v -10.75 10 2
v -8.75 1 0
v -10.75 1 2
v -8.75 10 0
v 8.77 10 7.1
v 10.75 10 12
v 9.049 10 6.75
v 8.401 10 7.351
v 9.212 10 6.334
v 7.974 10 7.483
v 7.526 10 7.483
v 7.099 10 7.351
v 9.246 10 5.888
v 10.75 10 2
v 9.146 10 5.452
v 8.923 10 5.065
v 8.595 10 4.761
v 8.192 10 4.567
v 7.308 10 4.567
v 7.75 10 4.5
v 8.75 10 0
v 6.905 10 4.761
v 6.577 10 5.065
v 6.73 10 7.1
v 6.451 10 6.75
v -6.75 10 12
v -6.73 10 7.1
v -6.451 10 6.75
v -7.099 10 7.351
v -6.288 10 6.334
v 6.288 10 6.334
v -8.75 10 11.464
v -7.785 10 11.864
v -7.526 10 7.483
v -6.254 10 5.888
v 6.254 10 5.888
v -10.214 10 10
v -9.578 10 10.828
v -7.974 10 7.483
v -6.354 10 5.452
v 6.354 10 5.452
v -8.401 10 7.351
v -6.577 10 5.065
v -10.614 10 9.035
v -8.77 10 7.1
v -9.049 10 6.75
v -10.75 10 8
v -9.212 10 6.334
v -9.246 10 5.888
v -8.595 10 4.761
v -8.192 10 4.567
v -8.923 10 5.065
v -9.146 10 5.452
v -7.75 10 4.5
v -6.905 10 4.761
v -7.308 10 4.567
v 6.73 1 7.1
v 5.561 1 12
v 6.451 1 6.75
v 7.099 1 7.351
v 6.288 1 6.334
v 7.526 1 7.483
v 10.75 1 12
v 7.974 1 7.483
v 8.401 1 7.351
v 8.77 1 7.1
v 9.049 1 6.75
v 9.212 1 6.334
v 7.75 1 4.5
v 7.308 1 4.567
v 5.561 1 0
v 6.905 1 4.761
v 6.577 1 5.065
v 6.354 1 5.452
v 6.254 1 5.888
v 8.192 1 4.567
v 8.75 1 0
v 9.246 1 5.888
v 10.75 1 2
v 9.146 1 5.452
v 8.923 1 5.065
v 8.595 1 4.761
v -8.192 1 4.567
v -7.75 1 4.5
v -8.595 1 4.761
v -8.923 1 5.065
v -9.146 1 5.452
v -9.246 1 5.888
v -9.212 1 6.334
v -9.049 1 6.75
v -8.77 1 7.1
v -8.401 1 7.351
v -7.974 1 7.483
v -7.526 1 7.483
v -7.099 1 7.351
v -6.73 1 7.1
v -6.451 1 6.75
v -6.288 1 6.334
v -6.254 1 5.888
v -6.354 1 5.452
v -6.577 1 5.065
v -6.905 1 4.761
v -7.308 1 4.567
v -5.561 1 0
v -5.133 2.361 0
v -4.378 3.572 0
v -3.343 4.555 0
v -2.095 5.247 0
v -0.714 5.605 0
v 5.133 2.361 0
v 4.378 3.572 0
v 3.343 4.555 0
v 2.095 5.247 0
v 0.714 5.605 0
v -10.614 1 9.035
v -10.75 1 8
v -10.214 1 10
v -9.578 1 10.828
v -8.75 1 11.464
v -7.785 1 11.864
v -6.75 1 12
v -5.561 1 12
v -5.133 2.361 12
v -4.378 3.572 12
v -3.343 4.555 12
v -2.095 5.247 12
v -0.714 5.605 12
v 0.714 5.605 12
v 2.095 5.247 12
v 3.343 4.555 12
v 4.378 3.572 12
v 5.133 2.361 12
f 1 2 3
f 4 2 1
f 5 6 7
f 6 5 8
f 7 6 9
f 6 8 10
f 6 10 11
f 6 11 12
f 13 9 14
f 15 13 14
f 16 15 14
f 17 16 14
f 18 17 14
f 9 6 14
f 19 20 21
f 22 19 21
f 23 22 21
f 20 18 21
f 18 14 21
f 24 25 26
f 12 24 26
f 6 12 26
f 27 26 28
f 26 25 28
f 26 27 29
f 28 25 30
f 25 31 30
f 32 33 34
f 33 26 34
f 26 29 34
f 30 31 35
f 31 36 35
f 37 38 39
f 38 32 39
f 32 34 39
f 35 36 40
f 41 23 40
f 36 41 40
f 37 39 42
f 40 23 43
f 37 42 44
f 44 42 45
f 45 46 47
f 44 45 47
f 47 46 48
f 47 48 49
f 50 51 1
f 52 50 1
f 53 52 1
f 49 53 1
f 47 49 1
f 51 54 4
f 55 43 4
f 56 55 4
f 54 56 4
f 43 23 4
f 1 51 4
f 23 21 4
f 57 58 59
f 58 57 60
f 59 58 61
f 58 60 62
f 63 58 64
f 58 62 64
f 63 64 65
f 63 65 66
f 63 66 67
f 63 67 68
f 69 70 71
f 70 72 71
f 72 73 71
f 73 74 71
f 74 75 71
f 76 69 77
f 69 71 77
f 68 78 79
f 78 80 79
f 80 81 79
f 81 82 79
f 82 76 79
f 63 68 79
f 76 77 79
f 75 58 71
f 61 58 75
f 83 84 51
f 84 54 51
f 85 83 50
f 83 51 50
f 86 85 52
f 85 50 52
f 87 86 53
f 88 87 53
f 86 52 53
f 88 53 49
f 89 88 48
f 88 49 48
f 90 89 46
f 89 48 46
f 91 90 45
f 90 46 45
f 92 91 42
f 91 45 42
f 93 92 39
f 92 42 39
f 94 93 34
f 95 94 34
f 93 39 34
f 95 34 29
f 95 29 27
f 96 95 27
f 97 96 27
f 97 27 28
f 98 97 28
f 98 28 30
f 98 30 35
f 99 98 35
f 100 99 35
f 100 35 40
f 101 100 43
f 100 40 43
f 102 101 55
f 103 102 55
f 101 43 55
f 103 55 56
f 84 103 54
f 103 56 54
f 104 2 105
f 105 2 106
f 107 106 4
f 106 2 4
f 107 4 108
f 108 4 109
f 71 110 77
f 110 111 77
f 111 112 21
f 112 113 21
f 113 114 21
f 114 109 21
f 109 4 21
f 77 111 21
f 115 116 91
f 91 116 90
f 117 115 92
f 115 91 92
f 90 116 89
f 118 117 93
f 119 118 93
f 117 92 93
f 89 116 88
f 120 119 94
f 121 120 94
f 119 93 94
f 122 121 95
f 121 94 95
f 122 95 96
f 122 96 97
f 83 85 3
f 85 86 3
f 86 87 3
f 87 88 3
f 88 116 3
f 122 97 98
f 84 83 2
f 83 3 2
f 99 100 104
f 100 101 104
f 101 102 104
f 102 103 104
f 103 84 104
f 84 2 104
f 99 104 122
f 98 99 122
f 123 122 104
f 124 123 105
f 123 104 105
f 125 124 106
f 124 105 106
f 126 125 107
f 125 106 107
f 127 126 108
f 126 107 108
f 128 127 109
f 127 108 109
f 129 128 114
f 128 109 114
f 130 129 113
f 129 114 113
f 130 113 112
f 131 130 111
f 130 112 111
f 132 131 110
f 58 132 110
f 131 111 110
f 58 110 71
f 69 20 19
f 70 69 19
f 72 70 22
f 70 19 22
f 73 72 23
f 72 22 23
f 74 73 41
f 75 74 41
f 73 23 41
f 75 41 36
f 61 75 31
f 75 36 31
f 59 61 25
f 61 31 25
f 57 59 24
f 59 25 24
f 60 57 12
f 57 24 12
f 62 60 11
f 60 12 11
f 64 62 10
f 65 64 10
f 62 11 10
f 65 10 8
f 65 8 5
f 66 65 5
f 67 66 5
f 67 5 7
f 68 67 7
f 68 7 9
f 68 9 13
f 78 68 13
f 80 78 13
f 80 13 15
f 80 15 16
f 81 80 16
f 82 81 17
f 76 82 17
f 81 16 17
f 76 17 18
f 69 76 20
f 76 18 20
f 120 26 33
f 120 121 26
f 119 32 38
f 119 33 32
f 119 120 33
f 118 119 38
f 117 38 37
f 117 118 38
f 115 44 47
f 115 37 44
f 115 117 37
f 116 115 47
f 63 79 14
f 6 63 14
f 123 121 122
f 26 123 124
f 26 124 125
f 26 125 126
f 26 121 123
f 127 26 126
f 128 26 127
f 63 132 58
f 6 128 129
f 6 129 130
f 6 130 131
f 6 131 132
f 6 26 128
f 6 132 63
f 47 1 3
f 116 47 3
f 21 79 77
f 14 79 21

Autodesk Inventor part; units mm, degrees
ref_plane "YZ Plane" through (0, 0, 0) normal (1, 0, 0) x (0, 1, 0)
ref_plane "XZ Plane" through (0, 0, 0) normal (0, 1, 0) x (-1, 0, 0)
ref_plane "XY Plane" through (0, 0, 0) normal (0, 0, 1) x (1, 0, 0)
sketch "Szkic1" plane through (0, 0, 0) normal (0, 0, 1) x (1, 0, 0)
  circle A0 centre (0, 0) radius 5.65
  line L0 (-10.75, 1) -> (10.75, 1)
  line L1 (10.75, 1) -> (10.75, 10)
  line L2 (10.75, 10) -> (-10.75, 10)
  line L3 (-10.75, 10) -> (-10.75, 1)
  dimension "d0" = 11.3
  dimension "d1" = 21.5
  dimension "d2" = 10.75
  dimension "d3" = 1
  dimension "d4" = 9
extrude "Wyciągnięcie proste1" add sketch "Szkic1" along normal blind 12 contours L0 A0 | A0 L0 L3 L2 L1 picked at (1.0817, 2.5289)
extrude "Wyciągnięcie proste2" cut sketch "Szkic1" along normal blind 12 contours A0 L0 | L0 A0
sketch "Szkic2" plane through (10.75, 1, 0) normal (0, -1, 0) x (1, 0, 0)
  line L0 (-5.1892, 12) -> (-5.1892, 0) projected
  line L1 (-5.1892, 0) -> (0, 0) projected
  line L2 (0, 0) -> (0, 12) projected
  line L3 (-5.1892, 12) -> (0, 12) projected
  line L4 (-16.3108, 0) -> (-16.3108, 12) projected
  line L5 (-21.5, 12) -> (-16.3108, 12) projected
  line L6 (-21.5, 0) -> (-21.5, 12) projected
  line L7 (-21.5, 0) -> (-16.3108, 0) projected
  point P0 (-10.75, 0)
  point P1 (-3, 6)
  point P2 (-18.5, 6)
  dimension "d9" = 12
  dimension "d10" = 5.1892
  dimension "d11" = 3
  dimension "d12" = 6
  dimension "d13" = 6
  dimension "d14" = 3
hole "Otwór1" at (7.75, 1, 6) at (-7.75, 1, 6) direction (0, 1, 0) diameter 3 end through all
fillet "Zaokrąglenie1" radius 4 1 edges at (-10.75, 5.5, 12)
chamfer "Faza1" distance 2 angle 45 2 edges at (-10.75, 5.5, 0) (10.75, 5.5, 0)
equation "\"d2\" = 0.5 * d1"
equation "\"d12\" = 0.5 * d9"
equation "\"d13\" = d12"
equation "\"d14\" = d11"
properties part number "3DP_ABS_Induction_Sensor_Mounting_Clamp"
